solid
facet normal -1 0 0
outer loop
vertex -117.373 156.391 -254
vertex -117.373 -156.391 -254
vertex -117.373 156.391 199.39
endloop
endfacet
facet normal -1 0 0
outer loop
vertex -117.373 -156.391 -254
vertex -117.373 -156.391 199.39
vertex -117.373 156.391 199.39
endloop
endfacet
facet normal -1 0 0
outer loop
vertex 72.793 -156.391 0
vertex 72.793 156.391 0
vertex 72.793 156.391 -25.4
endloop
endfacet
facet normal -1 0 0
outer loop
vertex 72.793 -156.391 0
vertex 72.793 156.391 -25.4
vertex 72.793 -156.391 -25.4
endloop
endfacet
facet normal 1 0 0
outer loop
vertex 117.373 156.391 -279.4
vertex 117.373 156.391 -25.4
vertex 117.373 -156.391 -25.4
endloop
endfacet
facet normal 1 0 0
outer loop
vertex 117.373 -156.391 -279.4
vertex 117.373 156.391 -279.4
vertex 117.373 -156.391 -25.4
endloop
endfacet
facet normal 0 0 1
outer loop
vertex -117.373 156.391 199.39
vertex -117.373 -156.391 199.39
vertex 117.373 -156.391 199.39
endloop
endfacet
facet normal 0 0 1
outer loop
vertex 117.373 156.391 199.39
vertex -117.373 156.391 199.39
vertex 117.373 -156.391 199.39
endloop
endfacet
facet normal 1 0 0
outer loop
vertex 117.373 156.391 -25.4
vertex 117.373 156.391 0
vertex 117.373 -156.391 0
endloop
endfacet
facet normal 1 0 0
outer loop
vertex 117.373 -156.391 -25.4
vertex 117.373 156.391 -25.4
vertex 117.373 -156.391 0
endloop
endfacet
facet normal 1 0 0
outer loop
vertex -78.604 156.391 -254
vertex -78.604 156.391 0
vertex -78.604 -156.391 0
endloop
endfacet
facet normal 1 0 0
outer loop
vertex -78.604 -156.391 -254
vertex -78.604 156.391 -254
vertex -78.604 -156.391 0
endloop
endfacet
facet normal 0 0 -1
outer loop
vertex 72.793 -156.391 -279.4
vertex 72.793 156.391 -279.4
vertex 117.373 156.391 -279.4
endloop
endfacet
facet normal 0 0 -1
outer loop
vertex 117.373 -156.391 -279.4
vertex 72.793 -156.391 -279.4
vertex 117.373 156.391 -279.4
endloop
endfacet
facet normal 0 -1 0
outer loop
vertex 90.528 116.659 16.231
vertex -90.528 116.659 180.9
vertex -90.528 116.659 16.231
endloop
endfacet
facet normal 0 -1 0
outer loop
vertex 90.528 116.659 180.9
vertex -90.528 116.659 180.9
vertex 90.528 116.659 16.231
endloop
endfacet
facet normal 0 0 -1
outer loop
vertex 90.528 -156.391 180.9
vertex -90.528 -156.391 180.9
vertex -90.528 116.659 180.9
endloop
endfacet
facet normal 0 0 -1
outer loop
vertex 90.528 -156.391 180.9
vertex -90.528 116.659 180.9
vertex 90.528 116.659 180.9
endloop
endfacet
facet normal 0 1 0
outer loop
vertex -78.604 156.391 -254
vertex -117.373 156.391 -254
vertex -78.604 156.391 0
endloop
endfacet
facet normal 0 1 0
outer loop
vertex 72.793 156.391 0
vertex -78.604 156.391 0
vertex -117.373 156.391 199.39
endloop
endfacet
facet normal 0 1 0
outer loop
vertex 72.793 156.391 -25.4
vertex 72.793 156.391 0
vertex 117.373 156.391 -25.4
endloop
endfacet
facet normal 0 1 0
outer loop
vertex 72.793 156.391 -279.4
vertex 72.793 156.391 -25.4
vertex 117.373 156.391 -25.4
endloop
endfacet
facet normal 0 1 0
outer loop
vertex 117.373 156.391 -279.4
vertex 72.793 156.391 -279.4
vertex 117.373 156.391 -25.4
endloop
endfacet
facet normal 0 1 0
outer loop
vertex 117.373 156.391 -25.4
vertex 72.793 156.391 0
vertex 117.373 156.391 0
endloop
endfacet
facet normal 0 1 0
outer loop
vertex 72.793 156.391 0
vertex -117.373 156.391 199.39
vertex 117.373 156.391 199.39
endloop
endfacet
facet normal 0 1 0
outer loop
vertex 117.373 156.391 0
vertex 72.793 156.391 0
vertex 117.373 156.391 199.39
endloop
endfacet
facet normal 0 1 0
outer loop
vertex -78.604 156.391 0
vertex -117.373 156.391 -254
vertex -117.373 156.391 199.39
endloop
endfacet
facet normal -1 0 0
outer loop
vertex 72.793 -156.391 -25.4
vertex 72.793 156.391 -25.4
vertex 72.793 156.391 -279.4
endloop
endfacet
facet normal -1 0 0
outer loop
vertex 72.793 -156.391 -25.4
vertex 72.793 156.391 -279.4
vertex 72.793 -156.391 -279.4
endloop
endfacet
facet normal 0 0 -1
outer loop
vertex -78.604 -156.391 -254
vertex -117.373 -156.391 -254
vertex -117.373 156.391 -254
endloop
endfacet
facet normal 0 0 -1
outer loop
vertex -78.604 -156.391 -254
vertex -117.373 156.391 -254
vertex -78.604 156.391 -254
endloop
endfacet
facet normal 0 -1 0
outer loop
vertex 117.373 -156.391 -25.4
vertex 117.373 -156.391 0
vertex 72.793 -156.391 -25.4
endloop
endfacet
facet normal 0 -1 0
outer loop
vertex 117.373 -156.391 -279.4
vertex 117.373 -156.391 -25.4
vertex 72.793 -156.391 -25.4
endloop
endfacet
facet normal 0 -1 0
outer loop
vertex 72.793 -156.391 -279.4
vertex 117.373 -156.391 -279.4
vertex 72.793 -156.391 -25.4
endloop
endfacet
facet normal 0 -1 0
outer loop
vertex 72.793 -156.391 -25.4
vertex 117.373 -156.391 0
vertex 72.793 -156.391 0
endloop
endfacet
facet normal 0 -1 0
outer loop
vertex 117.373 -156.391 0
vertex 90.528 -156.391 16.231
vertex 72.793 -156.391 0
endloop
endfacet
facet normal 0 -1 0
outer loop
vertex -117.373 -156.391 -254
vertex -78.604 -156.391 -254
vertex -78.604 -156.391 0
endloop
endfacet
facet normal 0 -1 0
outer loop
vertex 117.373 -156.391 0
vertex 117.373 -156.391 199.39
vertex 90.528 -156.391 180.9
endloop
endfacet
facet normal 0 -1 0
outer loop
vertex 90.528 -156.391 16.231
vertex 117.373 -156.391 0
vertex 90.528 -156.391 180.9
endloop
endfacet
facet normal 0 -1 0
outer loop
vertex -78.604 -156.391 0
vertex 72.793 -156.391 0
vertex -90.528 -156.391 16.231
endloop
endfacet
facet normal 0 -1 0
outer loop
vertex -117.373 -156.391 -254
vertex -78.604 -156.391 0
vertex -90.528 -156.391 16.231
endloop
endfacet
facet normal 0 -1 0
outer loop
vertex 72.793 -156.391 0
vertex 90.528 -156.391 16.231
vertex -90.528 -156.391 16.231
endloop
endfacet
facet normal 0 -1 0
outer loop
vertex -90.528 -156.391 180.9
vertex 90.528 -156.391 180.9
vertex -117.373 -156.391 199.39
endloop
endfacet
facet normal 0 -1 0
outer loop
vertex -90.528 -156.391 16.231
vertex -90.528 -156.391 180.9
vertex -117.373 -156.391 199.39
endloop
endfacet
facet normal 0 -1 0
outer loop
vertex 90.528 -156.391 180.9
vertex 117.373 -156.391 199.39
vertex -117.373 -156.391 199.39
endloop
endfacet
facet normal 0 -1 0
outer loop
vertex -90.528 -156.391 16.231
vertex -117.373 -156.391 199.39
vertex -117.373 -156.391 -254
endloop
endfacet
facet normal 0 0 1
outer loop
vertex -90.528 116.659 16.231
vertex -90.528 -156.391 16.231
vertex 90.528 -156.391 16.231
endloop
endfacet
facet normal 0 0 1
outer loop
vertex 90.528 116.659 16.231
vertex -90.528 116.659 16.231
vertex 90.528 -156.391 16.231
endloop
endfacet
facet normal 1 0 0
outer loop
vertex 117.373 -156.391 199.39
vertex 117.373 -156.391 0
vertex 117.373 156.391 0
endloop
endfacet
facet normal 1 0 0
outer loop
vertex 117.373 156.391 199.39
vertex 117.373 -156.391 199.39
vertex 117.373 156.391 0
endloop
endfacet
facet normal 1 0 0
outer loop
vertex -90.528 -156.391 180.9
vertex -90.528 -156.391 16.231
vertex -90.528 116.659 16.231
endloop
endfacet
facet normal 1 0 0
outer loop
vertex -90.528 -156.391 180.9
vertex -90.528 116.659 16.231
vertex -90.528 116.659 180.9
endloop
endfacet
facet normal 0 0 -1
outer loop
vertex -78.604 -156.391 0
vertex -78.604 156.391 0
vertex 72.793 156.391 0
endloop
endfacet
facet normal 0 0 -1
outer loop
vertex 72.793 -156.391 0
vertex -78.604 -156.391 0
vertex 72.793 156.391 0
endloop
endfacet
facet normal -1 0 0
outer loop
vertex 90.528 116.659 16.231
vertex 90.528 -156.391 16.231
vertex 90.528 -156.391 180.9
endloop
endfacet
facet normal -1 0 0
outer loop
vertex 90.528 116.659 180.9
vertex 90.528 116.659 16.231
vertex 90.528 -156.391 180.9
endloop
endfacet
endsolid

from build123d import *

# Parameters (mm, degrees)
F0_W       = 234.745592
F0_H       = 312.781454
F1_DEPTH   = 199.39
F2_W       = 184.208318
F2_H       = 143.576262
F3_DEPTH   = 283.464
F4_W       = 181.309238
F4_H       = 140.677188
F5_DEPTH   = 248.158
F6_DEPTH   = 270.002
F7_W       = 181.055784
F7_H       = 164.668828
F8_DEPTH   = 273.05
F10_DEPTH  = 254
F11_W      = 44.579953
F11_H      = 312.781454
F12_DEPTH  = 25.4
F12_FACE_W = 44.579952
F12_FACE_H = 312.781454
F13_DEPTH  = 254


with BuildPart() as f1:
    # F0 (on Top) → F1 (new body)
    with BuildSketch(Plane.XY):
        Rectangle(F0_W, F0_H)
    extrude(amount=F1_DEPTH)

    # F2 (on face) → F3 (join)
    with BuildSketch(Plane.XZ.offset(156.390727)):
        with Locations((0, 86.327426)):
            Rectangle(F2_W, F2_H)
    extrude(amount=-F3_DEPTH)

    # F4 (on face) → F5 (join)
    with BuildSketch(Plane.XZ.offset(156.390727)):
        with Locations((0, 94.606221)):
            Rectangle(F4_W, F4_H)
    extrude(amount=-F5_DEPTH)

    # F4 (on face) → F6 (join)
    with BuildSketch(Plane.XZ.offset(156.390727)):
        with Locations((0, 94.606221)):
            Rectangle(F4_W, F4_H)
    extrude(amount=-F6_DEPTH)

    # F7 (on face) → F8 (cut)
    with BuildSketch(Plane.XZ.offset(156.390727)):
        with Locations((0, 98.565549)):
            Rectangle(F7_W, F7_H)
    extrude(amount=-F8_DEPTH, mode=Mode.SUBTRACT)

    # F9 (on face) → F10 (join)
    with BuildSketch(Plane(origin=(0, 0, 0), x_dir=(1, 0, 0), z_dir=(0, 0, -1))):
        Polygon((-78.603908, -156.390727), (-78.603908, -125.591993), (-78.603908, 125.591993), (-78.603908, 156.390727), (-117.372796, 156.390727), (-117.372796, -156.390727), align=None)
    extrude(amount=F10_DEPTH)

    # F11 (on face) → F12 (join)
    with BuildSketch(Plane(origin=(0, 0, 0), x_dir=(1, 0, 0), z_dir=(0, 0, -1))):
        with Locations((95.082819, 0)):
            Rectangle(F11_W, F11_H)
    extrude(amount=F12_DEPTH)

    # F12_face (on face) → F13 (join)
    with BuildSketch(Plane(origin=(95.082819, 0, -25.4), x_dir=(1, 0, 0), z_dir=(0, 0, -1))):
        Rectangle(F12_FACE_W, F12_FACE_H)
    extrude(amount=F13_DEPTH)


solid = f1.part
